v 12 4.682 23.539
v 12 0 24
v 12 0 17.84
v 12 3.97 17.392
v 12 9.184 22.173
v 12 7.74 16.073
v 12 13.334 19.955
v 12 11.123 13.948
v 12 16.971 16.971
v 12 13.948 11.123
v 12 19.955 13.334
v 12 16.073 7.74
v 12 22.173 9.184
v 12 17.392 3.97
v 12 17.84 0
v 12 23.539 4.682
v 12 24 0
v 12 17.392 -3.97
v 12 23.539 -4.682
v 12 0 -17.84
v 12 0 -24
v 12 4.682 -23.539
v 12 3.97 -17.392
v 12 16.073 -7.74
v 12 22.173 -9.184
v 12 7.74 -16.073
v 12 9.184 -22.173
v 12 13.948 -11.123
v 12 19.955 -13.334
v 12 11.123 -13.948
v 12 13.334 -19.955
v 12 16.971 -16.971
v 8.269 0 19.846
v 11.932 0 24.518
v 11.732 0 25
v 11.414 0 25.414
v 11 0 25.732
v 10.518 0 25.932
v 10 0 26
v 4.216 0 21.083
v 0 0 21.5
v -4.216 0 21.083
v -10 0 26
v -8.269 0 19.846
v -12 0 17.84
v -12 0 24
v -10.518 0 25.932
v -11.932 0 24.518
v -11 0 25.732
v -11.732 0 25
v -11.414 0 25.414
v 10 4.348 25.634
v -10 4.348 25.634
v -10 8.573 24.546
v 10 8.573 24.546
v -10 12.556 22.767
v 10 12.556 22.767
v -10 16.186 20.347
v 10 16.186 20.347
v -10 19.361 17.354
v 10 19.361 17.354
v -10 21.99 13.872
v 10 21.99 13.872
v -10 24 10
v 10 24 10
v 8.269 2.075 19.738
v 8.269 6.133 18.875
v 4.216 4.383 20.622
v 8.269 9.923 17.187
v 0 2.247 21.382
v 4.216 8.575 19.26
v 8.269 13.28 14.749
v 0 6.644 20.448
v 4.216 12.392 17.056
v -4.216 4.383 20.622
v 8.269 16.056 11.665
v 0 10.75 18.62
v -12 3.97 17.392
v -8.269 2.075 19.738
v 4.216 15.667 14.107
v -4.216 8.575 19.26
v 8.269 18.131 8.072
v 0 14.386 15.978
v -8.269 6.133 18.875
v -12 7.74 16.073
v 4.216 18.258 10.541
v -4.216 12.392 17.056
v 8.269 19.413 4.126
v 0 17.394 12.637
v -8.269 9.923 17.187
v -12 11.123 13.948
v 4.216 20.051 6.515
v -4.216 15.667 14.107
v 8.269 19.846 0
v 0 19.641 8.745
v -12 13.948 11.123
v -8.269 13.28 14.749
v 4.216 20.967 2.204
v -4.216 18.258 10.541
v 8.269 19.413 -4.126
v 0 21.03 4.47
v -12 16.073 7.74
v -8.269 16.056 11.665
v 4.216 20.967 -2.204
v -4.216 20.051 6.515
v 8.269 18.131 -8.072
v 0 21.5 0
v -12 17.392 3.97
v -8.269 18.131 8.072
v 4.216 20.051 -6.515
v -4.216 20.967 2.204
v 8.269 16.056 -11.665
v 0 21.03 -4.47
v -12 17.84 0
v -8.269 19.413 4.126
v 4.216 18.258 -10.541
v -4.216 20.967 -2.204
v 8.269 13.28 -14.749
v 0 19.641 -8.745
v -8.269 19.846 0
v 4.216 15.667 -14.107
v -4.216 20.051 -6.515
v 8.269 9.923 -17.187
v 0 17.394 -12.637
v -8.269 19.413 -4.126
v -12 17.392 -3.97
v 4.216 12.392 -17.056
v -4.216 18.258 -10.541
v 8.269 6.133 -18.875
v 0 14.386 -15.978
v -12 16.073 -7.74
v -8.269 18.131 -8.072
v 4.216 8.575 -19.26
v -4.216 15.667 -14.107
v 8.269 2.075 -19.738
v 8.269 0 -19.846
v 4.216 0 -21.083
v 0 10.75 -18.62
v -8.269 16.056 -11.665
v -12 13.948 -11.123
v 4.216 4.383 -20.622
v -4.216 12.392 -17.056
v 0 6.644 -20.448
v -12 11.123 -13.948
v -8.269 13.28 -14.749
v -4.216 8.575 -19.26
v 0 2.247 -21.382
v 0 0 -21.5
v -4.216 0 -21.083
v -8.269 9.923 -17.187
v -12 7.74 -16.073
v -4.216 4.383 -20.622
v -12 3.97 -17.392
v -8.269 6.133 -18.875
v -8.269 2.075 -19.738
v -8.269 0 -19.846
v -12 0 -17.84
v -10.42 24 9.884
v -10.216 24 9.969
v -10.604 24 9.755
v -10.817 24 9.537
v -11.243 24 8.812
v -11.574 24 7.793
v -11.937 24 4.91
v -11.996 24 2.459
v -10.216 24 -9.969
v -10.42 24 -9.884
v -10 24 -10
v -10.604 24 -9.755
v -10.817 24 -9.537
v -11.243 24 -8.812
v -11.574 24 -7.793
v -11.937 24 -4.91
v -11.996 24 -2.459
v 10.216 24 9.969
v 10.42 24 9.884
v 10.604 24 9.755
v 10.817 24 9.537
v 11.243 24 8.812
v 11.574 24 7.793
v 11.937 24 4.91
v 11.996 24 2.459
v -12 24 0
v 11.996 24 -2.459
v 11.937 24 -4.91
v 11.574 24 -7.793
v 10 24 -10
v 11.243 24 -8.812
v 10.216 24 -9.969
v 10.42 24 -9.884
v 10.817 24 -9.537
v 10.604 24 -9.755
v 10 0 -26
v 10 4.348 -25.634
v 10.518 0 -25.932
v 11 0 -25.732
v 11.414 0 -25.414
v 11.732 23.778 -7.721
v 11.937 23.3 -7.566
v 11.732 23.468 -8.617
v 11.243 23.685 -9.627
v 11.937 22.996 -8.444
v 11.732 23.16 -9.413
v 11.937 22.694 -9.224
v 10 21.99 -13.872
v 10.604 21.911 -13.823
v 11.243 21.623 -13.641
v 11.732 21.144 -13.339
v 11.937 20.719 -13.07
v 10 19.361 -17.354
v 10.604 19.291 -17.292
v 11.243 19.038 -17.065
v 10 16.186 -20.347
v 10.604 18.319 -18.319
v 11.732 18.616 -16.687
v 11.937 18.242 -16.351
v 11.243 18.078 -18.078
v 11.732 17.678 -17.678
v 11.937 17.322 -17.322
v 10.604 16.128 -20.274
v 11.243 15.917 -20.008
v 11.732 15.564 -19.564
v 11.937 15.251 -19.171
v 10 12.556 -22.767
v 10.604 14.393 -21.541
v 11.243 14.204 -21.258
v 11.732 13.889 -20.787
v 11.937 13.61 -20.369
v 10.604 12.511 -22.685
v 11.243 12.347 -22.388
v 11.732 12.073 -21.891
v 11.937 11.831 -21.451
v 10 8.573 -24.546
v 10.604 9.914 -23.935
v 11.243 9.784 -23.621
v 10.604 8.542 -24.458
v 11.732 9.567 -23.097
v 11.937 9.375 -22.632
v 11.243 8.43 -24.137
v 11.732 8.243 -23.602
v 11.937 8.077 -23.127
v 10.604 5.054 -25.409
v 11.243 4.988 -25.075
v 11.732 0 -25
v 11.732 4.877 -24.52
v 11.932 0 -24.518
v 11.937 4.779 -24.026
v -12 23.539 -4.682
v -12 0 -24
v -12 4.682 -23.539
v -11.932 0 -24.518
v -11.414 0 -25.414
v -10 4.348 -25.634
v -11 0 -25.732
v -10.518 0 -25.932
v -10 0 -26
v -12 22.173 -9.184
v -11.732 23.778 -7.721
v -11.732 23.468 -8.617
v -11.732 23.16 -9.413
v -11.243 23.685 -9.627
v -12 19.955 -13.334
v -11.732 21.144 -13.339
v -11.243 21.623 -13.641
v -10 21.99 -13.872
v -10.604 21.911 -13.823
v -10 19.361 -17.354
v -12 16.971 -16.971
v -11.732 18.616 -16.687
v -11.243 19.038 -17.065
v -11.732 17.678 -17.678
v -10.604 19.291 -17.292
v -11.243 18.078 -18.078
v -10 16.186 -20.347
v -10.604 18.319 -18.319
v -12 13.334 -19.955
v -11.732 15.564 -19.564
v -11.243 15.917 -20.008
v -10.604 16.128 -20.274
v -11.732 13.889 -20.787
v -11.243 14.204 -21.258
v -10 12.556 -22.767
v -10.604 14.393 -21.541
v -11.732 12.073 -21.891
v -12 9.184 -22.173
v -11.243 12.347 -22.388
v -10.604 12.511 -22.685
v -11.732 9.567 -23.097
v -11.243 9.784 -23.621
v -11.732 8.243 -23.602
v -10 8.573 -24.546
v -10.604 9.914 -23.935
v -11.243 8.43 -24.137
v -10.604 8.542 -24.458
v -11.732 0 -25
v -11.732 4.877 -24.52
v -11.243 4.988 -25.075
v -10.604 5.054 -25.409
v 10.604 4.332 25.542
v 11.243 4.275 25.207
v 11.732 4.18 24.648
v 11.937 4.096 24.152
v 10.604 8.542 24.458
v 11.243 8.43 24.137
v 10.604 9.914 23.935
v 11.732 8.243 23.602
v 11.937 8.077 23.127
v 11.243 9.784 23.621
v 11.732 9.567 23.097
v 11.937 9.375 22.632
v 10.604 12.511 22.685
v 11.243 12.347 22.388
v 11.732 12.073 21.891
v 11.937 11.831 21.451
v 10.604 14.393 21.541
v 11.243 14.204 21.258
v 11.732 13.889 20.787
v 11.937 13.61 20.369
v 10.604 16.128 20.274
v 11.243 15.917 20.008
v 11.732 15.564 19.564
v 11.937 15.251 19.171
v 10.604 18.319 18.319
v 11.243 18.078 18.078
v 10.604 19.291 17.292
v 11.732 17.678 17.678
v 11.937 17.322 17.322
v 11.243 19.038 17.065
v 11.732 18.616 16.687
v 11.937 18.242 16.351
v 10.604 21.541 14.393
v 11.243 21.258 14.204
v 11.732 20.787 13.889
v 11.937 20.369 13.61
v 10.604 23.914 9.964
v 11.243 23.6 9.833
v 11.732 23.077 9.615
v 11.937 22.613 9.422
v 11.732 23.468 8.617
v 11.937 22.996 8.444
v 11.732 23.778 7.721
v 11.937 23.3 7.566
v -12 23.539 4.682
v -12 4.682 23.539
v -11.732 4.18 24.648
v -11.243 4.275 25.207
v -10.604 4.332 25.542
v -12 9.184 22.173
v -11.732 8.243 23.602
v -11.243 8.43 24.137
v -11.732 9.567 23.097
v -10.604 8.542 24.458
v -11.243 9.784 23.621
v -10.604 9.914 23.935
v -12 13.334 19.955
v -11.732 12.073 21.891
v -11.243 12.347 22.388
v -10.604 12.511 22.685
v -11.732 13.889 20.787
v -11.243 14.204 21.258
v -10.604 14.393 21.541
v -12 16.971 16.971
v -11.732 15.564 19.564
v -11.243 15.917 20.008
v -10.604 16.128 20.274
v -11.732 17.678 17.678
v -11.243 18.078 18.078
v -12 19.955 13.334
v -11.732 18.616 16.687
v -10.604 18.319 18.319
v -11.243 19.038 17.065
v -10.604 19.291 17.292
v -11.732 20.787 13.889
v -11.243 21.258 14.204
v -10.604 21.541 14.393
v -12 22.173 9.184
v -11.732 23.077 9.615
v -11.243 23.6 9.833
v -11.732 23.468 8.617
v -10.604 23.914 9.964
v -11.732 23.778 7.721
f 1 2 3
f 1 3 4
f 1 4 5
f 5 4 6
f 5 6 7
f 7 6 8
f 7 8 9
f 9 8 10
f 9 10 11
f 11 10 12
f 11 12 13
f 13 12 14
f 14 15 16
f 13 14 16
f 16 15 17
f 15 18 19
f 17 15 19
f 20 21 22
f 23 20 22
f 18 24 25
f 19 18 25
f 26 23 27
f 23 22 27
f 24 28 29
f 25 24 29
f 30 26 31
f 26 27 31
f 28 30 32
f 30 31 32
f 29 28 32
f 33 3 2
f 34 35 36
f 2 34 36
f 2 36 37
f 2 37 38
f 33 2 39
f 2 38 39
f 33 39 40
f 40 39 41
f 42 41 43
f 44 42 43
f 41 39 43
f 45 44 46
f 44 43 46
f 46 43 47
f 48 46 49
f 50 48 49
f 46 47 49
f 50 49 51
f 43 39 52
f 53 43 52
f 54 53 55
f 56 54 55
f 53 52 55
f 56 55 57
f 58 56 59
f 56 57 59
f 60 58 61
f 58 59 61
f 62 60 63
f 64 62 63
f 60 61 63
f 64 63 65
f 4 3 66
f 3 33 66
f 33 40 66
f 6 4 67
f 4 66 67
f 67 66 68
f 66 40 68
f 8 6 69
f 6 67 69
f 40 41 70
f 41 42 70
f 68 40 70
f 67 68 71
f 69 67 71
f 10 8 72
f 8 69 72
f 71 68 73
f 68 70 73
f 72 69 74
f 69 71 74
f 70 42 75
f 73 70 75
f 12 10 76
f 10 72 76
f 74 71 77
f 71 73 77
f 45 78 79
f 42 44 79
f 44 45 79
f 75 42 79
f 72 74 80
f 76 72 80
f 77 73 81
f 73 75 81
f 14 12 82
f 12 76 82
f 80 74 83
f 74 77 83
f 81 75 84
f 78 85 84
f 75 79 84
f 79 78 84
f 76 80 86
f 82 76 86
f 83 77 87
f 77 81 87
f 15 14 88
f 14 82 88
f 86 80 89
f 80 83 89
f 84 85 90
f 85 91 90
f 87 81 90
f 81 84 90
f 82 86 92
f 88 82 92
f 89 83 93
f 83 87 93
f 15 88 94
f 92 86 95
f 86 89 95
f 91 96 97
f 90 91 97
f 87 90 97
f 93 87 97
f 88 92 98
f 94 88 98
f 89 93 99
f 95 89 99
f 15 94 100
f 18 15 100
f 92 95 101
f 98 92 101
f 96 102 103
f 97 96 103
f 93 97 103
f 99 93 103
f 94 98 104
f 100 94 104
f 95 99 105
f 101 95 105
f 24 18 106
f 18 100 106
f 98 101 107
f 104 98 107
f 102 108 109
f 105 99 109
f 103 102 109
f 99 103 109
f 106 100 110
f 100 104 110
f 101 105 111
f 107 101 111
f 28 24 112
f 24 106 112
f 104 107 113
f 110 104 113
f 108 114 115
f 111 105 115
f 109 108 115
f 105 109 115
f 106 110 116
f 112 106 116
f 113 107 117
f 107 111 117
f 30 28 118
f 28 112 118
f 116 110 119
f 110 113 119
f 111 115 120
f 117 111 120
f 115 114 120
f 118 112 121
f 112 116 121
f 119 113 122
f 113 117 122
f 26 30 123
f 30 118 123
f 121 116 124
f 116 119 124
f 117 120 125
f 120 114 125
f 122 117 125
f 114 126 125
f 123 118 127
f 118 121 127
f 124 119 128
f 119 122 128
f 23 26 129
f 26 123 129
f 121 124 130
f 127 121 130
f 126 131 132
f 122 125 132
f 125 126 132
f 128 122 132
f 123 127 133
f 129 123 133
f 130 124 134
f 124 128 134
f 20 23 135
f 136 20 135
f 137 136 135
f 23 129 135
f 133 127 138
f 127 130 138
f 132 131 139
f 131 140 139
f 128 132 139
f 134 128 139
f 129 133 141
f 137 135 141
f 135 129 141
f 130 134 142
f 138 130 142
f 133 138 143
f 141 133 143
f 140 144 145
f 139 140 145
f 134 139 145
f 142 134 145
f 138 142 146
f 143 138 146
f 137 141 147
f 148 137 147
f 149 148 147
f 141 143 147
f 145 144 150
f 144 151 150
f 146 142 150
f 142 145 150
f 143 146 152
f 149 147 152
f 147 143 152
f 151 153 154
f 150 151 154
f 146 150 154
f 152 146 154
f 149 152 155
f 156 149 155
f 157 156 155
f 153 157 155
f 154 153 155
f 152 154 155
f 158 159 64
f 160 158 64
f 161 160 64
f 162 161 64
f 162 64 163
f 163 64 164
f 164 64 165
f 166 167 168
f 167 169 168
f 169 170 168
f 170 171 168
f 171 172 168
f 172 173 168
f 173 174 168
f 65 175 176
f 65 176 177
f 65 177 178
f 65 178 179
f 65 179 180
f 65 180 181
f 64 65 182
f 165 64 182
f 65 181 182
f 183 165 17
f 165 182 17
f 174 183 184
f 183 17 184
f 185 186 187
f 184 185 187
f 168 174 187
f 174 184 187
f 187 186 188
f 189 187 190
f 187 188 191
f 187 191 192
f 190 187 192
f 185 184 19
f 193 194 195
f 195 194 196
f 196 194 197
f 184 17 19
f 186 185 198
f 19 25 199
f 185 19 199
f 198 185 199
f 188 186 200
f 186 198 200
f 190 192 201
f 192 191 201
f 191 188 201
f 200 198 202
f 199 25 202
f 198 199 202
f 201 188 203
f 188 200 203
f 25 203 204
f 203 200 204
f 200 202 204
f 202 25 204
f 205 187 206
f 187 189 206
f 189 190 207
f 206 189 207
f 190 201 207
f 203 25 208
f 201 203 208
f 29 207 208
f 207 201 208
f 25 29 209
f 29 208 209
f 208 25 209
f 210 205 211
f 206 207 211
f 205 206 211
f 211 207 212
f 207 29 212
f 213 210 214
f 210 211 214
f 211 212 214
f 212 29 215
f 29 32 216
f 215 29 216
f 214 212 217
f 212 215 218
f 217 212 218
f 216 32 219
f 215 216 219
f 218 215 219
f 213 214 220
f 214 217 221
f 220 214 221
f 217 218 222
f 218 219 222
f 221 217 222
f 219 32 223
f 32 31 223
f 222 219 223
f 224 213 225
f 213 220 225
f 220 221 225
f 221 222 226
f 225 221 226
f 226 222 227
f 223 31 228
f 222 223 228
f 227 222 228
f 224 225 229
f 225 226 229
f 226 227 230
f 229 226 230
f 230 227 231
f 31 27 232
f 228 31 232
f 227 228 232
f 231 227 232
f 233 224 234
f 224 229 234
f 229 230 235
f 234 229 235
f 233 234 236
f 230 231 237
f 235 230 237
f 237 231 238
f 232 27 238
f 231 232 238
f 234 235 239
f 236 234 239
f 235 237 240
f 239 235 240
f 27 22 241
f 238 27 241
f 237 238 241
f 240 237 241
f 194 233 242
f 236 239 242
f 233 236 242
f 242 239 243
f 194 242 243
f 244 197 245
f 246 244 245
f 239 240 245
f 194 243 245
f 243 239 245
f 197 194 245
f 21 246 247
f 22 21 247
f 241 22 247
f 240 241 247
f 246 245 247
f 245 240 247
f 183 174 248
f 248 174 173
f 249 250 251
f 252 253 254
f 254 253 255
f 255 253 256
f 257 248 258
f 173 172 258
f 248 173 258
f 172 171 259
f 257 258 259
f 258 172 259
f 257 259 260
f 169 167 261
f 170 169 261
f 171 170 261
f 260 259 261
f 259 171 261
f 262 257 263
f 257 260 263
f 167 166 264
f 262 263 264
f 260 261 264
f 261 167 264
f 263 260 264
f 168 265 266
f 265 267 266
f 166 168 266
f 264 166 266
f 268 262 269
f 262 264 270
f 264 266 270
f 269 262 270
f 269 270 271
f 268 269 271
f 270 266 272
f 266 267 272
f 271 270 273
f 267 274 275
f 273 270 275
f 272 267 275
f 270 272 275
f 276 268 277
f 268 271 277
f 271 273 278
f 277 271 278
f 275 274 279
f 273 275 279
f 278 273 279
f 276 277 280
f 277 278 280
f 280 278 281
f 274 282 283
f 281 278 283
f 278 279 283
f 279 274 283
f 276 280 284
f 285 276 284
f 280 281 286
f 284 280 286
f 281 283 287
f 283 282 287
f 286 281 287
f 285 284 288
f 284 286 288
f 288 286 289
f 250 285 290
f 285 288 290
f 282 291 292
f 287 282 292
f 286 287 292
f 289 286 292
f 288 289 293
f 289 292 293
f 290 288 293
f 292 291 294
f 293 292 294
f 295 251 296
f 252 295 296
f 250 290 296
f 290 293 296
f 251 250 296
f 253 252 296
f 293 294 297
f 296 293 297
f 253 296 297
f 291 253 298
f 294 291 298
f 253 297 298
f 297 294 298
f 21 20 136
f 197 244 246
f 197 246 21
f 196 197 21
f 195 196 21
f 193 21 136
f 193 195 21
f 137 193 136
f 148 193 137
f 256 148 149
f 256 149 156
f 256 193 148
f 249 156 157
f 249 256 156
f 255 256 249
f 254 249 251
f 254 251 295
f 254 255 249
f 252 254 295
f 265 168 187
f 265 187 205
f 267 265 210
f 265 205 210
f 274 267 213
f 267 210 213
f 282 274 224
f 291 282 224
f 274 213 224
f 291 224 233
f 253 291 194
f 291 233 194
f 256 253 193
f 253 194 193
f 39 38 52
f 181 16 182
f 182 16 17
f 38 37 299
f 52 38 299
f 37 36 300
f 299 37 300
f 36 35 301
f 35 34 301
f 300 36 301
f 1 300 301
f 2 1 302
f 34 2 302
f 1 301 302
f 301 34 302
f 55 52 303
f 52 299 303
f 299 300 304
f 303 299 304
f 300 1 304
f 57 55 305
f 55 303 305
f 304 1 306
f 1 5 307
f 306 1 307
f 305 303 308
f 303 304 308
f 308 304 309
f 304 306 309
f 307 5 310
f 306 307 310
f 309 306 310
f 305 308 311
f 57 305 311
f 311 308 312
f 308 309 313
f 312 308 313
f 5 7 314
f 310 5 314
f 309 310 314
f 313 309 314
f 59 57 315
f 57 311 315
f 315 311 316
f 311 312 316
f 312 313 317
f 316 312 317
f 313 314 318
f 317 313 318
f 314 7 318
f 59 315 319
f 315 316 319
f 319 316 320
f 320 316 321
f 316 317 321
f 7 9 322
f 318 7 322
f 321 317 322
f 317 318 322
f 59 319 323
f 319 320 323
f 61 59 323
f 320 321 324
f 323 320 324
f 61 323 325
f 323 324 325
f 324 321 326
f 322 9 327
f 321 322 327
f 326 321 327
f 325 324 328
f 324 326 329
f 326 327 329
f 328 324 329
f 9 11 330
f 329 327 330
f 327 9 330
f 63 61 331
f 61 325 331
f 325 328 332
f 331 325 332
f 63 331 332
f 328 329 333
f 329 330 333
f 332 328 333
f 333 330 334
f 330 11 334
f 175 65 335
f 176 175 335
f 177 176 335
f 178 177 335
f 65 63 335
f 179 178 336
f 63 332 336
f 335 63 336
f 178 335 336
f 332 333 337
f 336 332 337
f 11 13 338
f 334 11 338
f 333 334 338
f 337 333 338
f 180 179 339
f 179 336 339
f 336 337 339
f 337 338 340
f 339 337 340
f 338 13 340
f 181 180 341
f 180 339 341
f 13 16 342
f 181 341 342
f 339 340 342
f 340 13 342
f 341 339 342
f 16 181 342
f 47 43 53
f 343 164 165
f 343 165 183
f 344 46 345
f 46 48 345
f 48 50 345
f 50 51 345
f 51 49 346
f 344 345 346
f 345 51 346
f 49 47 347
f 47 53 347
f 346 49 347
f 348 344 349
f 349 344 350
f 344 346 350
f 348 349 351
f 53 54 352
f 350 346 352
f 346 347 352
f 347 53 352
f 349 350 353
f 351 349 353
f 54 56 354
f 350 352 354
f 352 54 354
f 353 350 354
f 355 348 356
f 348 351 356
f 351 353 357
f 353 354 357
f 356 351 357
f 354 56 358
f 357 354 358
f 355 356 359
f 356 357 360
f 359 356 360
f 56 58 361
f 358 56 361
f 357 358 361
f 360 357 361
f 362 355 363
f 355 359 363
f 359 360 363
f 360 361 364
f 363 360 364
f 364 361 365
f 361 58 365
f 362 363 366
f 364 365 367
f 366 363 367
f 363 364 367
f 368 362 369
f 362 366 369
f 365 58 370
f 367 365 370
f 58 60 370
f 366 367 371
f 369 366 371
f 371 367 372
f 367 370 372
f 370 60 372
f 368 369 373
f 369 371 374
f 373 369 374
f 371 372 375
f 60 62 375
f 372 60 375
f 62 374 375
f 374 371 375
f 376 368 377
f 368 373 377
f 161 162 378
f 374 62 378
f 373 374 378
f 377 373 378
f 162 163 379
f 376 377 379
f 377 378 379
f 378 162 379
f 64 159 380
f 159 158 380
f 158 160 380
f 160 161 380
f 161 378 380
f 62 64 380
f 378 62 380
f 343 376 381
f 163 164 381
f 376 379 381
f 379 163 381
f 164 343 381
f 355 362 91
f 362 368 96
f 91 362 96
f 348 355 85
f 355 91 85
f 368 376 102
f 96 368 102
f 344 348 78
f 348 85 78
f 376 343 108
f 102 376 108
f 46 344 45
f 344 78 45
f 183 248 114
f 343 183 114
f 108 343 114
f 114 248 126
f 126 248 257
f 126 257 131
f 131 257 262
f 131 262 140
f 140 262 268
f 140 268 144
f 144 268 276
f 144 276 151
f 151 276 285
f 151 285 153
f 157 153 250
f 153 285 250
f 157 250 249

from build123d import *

# Parameters (mm, degrees)
BASE_R_VOLUTION_ANGLE   = 180
ESQUISSE2_W             = 44
ESQUISSE2_H             = 6
ENL_V_MAT_EXTRU_1_DEPTH = 25


with BuildPart() as part:
    # Esquisse1 → Base-Révolution (revolve, symmetric)
    with BuildSketch(Plane.XY) as base_r_volution_sk:
        with BuildLine():
            Line((-12, 17.839562775), (-12, 24))
            ThreePointArc((-12, 24), (-11.414213562, 25.414213562), (-10, 26))
            Line((-10, 26), (10, 26))
            ThreePointArc((10, 26), (11.414213562, 25.414213562), (12, 24))
            Line((12, 24), (12, 17.839562775))
            ThreePointArc((12, 17.839562775), (0, 21.5), (-12, 17.839562775))
        make_face()
    revolve(axis=Axis((-22, 0, 0), (1, 0, 0)), revolution_arc=BASE_R_VOLUTION_ANGLE / 2)
    revolve(base_r_volution_sk.sketch, axis=Axis((-22, 0, 0), (-1, 0, 0)), revolution_arc=BASE_R_VOLUTION_ANGLE / 2)

    # Esquisse2 → Enlèv. mat.-Extru.1 (cut, through all)
    with BuildSketch(Plane(origin=(12, 0, 0), x_dir=(0, 0, -1), z_dir=(1, 0, 0))):
        with Locations((0, 27)):
            Rectangle(ESQUISSE2_W, ESQUISSE2_H)
    extrude(amount=-ENL_V_MAT_EXTRU_1_DEPTH, mode=Mode.SUBTRACT)


solid = part.part
